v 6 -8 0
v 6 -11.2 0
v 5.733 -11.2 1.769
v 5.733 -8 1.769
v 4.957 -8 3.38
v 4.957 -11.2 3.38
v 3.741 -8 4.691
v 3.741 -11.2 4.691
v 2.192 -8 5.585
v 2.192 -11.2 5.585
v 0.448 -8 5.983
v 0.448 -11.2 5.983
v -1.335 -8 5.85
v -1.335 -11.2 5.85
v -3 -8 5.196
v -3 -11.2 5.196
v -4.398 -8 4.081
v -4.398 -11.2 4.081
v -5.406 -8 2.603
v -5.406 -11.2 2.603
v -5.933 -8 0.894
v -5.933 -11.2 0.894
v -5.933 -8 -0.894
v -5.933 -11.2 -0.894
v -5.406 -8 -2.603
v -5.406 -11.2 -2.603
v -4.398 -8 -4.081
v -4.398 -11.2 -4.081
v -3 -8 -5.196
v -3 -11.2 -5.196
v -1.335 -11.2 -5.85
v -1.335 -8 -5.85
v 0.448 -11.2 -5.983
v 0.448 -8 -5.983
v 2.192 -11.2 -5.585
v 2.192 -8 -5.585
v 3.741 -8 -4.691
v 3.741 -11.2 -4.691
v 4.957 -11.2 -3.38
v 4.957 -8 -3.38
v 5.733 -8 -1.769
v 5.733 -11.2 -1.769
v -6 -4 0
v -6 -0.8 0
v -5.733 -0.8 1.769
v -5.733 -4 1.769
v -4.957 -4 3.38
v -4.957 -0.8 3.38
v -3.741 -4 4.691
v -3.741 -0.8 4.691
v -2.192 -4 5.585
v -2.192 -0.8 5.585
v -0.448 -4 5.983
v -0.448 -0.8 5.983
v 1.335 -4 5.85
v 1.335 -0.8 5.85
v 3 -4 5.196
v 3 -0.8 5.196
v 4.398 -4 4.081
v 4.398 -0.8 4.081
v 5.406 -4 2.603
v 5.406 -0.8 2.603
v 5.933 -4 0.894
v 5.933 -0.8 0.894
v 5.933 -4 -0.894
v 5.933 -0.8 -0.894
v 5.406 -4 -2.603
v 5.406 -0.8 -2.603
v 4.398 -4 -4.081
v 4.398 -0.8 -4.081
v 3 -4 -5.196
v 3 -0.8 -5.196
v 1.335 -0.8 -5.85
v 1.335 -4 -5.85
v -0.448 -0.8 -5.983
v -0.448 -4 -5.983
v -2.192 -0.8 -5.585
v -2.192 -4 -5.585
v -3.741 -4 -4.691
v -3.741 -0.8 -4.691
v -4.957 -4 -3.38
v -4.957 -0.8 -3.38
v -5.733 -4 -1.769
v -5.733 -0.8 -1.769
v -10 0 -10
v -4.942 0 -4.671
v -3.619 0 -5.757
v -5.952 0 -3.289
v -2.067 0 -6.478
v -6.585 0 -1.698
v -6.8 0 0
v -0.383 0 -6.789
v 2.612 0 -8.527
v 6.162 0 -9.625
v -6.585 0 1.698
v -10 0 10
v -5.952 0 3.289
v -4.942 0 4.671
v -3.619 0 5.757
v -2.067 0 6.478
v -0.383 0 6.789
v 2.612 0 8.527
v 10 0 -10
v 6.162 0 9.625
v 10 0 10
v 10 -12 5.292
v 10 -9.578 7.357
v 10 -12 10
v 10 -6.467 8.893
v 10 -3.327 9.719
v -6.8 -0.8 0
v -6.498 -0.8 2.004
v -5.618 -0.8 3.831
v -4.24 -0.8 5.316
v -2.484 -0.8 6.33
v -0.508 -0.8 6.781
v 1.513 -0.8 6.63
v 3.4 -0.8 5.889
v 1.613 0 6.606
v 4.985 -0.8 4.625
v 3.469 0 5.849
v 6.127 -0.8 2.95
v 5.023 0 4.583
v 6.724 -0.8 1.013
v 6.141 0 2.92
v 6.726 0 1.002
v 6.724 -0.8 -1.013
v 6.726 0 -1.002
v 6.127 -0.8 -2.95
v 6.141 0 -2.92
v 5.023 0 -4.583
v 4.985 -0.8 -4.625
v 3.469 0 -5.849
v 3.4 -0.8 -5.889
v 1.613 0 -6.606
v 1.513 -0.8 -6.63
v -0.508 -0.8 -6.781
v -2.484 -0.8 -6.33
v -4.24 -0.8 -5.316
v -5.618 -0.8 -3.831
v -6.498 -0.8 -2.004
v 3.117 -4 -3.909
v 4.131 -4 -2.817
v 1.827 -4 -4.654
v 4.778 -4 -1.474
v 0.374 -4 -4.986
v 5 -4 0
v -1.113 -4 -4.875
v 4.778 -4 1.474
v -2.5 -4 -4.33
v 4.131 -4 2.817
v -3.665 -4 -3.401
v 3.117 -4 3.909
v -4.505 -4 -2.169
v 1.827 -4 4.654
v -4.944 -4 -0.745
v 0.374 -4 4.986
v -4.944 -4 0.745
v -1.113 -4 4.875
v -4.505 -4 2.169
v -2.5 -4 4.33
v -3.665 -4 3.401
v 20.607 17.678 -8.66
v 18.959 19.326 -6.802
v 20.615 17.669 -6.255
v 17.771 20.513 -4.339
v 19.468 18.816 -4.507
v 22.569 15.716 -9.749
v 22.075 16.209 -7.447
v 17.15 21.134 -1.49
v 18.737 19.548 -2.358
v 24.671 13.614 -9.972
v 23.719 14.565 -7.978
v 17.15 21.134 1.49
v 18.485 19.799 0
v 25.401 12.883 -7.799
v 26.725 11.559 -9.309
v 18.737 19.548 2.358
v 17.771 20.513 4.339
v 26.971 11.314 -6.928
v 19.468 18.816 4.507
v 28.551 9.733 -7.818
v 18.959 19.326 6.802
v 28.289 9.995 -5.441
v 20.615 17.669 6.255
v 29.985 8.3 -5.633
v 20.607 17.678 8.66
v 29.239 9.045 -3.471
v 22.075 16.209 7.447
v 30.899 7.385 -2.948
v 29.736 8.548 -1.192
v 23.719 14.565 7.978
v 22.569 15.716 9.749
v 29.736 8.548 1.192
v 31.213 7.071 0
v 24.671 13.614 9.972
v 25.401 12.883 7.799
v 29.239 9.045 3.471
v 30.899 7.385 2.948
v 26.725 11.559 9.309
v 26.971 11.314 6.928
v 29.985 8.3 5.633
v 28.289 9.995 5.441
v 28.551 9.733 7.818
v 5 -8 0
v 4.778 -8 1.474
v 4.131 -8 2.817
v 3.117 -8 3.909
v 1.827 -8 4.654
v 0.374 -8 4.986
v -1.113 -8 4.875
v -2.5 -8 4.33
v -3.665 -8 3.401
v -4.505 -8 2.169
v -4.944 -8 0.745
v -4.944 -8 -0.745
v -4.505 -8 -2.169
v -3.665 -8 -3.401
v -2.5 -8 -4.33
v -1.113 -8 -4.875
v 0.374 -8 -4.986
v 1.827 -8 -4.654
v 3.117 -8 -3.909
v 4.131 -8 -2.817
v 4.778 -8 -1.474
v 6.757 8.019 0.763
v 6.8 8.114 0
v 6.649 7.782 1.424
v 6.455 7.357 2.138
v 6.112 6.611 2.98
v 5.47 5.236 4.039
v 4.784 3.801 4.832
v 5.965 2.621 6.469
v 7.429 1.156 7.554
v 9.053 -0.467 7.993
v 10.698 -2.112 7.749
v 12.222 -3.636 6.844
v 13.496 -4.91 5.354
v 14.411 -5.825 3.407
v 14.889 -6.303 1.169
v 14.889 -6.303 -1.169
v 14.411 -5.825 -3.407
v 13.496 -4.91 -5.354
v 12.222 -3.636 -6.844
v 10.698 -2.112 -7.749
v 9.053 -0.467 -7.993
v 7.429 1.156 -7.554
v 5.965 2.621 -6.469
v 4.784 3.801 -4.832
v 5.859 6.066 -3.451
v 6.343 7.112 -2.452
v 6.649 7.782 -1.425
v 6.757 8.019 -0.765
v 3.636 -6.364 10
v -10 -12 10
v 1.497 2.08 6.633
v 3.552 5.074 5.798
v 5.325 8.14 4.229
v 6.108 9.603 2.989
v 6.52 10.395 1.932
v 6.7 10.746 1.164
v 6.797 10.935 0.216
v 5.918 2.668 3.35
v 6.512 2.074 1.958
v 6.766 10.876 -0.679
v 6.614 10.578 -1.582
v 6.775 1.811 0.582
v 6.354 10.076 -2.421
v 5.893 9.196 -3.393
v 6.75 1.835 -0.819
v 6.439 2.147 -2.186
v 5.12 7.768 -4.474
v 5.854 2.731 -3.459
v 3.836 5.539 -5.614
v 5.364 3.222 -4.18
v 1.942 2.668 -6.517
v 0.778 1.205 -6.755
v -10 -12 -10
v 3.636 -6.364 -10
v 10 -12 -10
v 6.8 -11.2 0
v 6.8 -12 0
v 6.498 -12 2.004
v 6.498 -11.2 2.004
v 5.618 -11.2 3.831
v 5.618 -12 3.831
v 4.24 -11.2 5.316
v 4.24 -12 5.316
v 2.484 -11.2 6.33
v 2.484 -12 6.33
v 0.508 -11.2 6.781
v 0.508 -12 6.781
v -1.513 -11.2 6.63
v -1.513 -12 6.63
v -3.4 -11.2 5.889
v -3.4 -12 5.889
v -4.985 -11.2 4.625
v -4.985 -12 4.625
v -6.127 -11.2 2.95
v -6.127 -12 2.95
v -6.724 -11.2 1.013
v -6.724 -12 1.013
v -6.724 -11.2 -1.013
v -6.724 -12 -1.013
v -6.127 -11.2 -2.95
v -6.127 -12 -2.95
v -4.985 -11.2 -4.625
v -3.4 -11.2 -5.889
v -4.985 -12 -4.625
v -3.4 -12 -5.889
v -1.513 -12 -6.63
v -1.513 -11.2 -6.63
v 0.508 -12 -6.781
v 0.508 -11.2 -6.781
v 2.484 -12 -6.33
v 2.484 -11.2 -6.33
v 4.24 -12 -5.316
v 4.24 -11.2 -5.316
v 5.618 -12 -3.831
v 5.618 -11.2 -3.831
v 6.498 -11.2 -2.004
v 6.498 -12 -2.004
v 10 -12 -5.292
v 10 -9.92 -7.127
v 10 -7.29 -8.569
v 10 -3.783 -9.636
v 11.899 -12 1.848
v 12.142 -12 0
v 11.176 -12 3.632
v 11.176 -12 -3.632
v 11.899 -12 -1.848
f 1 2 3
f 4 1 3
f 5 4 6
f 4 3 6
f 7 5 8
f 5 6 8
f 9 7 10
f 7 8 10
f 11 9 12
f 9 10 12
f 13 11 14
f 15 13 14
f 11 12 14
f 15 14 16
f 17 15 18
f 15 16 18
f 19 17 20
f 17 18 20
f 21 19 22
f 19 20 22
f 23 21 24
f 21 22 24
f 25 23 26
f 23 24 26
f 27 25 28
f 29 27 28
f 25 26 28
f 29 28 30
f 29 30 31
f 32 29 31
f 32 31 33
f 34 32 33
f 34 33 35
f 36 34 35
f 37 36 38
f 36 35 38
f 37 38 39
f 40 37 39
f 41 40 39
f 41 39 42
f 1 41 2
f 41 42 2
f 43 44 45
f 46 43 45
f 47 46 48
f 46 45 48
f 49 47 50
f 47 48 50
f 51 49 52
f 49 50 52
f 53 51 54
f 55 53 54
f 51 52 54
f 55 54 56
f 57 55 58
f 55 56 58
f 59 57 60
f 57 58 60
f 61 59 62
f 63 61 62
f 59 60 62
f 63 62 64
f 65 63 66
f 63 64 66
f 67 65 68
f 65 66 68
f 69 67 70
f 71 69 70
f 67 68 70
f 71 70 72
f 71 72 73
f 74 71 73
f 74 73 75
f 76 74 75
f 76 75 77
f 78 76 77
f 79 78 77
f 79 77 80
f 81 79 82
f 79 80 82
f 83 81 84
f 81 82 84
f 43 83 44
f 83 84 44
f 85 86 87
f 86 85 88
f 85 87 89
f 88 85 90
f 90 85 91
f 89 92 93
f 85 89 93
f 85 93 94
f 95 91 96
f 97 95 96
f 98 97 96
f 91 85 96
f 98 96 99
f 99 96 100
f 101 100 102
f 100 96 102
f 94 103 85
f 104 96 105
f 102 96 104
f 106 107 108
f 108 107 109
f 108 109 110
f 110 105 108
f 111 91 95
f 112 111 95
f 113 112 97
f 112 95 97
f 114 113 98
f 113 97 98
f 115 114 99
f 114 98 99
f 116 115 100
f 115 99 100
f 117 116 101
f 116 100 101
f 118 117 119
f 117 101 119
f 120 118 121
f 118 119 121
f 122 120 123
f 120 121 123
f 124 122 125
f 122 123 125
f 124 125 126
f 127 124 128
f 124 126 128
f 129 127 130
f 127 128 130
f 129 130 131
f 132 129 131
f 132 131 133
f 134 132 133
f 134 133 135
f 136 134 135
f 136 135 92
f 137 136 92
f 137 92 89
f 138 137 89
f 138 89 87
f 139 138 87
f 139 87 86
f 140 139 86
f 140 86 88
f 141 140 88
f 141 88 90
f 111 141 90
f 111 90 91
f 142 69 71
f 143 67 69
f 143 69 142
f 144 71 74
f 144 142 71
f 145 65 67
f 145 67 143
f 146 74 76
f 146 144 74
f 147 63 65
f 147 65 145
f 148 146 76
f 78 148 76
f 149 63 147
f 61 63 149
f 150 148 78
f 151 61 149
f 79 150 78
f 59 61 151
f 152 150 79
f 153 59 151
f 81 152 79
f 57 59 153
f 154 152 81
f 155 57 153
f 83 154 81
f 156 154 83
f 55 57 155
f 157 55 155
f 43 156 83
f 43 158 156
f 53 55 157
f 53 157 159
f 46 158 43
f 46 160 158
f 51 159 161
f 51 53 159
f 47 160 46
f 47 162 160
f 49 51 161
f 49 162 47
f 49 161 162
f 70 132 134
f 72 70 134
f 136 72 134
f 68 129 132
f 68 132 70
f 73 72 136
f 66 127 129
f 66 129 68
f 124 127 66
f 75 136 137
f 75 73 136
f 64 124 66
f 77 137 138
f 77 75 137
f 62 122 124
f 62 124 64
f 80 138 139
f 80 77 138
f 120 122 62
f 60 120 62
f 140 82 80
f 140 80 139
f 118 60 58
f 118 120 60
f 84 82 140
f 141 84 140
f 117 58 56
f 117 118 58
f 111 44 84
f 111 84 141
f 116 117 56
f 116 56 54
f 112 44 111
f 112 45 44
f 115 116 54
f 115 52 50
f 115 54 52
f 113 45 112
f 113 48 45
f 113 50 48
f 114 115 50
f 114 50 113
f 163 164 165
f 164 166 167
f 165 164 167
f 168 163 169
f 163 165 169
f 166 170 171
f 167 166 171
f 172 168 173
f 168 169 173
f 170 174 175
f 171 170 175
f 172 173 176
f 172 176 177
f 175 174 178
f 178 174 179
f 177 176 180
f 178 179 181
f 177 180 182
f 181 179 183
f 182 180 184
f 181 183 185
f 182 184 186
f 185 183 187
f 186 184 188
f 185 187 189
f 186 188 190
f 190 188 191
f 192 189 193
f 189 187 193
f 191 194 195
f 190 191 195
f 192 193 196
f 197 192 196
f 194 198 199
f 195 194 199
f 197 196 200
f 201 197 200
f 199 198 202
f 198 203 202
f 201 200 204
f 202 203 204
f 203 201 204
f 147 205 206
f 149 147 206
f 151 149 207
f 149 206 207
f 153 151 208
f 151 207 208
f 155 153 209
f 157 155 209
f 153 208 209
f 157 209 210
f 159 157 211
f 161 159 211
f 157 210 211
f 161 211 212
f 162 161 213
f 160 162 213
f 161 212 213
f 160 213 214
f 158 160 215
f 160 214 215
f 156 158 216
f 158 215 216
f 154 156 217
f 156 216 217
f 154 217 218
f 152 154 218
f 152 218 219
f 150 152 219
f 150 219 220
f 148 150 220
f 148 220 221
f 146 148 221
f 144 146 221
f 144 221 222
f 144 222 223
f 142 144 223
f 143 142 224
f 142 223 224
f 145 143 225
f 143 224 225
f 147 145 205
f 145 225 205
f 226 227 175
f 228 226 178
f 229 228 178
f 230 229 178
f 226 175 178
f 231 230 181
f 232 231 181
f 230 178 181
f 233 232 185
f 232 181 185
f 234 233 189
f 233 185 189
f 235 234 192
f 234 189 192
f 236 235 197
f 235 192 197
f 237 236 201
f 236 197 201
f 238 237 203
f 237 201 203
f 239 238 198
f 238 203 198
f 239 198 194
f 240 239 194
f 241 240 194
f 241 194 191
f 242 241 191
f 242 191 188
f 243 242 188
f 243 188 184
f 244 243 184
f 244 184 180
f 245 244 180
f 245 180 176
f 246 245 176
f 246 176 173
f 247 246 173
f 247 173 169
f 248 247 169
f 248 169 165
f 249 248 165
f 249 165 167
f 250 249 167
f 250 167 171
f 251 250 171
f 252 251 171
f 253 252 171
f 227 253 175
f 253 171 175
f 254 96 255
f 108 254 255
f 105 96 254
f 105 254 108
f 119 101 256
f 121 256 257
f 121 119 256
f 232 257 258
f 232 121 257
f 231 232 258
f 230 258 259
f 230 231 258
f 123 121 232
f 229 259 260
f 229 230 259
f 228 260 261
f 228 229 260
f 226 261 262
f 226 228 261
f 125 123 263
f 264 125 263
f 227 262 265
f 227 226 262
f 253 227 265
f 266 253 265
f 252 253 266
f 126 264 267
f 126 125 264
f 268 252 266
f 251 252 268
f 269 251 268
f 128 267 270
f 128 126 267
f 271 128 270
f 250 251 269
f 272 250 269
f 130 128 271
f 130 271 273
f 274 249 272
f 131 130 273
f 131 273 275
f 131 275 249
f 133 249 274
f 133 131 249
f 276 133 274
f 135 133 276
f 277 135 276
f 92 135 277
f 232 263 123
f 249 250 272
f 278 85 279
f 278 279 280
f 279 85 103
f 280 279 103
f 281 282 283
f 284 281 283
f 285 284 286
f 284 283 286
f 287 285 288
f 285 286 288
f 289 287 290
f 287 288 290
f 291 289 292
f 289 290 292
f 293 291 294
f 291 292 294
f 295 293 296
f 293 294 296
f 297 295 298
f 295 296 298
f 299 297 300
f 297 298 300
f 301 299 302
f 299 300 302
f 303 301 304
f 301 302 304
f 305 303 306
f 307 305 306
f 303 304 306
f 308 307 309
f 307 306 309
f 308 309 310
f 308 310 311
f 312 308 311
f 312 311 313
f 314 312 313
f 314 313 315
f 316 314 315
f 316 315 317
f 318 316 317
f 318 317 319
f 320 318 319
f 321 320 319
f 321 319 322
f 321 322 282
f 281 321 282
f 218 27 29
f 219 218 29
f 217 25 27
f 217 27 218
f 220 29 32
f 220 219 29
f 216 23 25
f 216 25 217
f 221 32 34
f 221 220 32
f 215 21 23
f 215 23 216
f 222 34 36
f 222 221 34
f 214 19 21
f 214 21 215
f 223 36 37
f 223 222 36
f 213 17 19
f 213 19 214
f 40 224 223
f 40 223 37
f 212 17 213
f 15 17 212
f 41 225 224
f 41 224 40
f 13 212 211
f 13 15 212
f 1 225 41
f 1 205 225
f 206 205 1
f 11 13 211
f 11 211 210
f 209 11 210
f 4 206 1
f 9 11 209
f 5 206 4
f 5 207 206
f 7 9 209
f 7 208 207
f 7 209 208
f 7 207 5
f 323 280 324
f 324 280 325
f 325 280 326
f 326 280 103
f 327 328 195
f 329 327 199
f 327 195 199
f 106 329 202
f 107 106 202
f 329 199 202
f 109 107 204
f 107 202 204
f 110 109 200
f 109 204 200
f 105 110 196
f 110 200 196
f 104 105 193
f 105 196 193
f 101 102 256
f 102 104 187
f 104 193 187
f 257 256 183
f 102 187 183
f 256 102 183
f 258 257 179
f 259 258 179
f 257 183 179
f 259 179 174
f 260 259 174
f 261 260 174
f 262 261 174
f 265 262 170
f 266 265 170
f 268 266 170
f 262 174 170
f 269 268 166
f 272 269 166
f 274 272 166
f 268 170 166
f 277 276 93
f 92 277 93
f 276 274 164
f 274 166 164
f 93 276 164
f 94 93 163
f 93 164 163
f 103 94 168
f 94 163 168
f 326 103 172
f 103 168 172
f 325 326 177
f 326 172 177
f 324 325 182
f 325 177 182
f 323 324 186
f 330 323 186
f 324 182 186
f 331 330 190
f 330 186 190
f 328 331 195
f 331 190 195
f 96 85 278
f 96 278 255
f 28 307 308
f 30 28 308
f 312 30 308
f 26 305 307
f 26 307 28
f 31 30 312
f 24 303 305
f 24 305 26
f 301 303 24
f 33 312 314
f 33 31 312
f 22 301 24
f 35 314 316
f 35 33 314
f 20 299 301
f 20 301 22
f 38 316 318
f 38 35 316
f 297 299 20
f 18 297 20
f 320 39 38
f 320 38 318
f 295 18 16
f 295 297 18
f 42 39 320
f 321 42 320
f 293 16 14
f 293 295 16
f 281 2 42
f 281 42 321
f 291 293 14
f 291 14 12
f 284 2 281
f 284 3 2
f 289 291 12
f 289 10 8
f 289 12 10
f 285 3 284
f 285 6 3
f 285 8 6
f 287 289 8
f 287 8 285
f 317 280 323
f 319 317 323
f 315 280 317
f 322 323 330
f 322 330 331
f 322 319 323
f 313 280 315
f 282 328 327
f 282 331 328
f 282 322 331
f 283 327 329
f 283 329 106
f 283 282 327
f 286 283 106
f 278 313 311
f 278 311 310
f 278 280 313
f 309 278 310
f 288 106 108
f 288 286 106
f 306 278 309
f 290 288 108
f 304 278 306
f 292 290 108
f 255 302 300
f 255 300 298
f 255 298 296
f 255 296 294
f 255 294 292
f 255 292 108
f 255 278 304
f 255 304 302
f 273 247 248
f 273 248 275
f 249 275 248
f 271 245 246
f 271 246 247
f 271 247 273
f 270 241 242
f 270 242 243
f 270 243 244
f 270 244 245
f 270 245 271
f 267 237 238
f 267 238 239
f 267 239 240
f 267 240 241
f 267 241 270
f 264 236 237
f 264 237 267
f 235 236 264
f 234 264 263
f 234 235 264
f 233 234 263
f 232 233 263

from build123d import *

# Parameters (mm, degrees)
F0_W          = 20
F0_H          = 20
F1_DEPTH      = 12
F3_R          = 10
F4_DEPTH      = 20
F4_DEPTH_BACK = 9
F5_R          = 6.8
F6_DEPTH      = 0.8
F7_R          = 6.8
F8_DEPTH      = 0.8
F8_DEPTH_BACK = 25
F9_R          = 6
F10_DEPTH     = 3.2
F11_R         = 6
F12_DEPTH     = 3.2
F13_R         = 5
F14_DEPTH     = 4
F15_W         = 6.5863579512
F15_H         = 20
F16_DEPTH     = 25
F17_R         = 8
F18_DEPTH     = 21


with BuildPart() as f1:
    # F0 (on Front) → F1 (new body)
    with BuildSketch(Plane.XZ):
        Rectangle(F0_W, F0_H)
    extrude(amount=F1_DEPTH)

    # F3 (on face) → F4 (join, two sides)
    with BuildSketch(Plane(origin=(5, 5, 0), x_dir=(0.7071067812, -0.7071067812, 0), z_dir=(-0.7071067812, -0.7071067812, 0))) as f4_sk:
        with Locations((7.0710678119, 0)):
            Circle(F3_R)
    extrude(amount=-F4_DEPTH)
    extrude(f4_sk.sketch, amount=F4_DEPTH_BACK)

    # F5 (on face) → F6 (cut)
    with BuildSketch(Plane.XZ.offset(12)):
        Circle(F5_R)
    extrude(amount=-F6_DEPTH, mode=Mode.SUBTRACT)

    # F7 (on face) → F8 (cut, two sides)
    with BuildSketch(Plane(origin=(0, 0, 0), x_dir=(-1, 0, 0), z_dir=(0, 1, 0))) as f8_sk:
        Circle(F7_R)
    extrude(amount=-F8_DEPTH, mode=Mode.SUBTRACT)
    extrude(f8_sk.sketch, amount=F8_DEPTH_BACK, mode=Mode.SUBTRACT)

    # F9 (on face) → F10 (cut)
    with BuildSketch(Plane(origin=(0, -0.8, 0), x_dir=(-1, 0, 0), z_dir=(0, 1, 0))):
        Circle(F9_R)
    extrude(amount=-F10_DEPTH, mode=Mode.SUBTRACT)

    # F11 (on face) → F12 (cut)
    with BuildSketch(Plane.XZ.offset(11.2)):
        Circle(F11_R)
    extrude(amount=-F12_DEPTH, mode=Mode.SUBTRACT)

    # F13 (on face) → F14 (cut, through all)
    with BuildSketch(Plane.XZ.offset(8)):
        Circle(F13_R)
    extrude(amount=-F14_DEPTH, mode=Mode.SUBTRACT)

    # F15 (on Right) → F16 (cut)
    with BuildSketch(Plane.YZ):
        with Locations((-15.2931789756, 0)):
            Rectangle(F15_W, F15_H)
    extrude(amount=F16_DEPTH, mode=Mode.SUBTRACT)

    # F17 (on face) → F18 (cut)
    with BuildSketch(Plane(origin=(19.1421356237, 19.1421356237, 0), x_dir=(-0.7071067812, 0.7071067812, 0), z_dir=(0.7071067812, 0.7071067812, 0))):
        with Locations((-7.0710678119, 0)):
            Circle(F17_R)
    extrude(amount=-F18_DEPTH, mode=Mode.SUBTRACT)


solid = f1.part
